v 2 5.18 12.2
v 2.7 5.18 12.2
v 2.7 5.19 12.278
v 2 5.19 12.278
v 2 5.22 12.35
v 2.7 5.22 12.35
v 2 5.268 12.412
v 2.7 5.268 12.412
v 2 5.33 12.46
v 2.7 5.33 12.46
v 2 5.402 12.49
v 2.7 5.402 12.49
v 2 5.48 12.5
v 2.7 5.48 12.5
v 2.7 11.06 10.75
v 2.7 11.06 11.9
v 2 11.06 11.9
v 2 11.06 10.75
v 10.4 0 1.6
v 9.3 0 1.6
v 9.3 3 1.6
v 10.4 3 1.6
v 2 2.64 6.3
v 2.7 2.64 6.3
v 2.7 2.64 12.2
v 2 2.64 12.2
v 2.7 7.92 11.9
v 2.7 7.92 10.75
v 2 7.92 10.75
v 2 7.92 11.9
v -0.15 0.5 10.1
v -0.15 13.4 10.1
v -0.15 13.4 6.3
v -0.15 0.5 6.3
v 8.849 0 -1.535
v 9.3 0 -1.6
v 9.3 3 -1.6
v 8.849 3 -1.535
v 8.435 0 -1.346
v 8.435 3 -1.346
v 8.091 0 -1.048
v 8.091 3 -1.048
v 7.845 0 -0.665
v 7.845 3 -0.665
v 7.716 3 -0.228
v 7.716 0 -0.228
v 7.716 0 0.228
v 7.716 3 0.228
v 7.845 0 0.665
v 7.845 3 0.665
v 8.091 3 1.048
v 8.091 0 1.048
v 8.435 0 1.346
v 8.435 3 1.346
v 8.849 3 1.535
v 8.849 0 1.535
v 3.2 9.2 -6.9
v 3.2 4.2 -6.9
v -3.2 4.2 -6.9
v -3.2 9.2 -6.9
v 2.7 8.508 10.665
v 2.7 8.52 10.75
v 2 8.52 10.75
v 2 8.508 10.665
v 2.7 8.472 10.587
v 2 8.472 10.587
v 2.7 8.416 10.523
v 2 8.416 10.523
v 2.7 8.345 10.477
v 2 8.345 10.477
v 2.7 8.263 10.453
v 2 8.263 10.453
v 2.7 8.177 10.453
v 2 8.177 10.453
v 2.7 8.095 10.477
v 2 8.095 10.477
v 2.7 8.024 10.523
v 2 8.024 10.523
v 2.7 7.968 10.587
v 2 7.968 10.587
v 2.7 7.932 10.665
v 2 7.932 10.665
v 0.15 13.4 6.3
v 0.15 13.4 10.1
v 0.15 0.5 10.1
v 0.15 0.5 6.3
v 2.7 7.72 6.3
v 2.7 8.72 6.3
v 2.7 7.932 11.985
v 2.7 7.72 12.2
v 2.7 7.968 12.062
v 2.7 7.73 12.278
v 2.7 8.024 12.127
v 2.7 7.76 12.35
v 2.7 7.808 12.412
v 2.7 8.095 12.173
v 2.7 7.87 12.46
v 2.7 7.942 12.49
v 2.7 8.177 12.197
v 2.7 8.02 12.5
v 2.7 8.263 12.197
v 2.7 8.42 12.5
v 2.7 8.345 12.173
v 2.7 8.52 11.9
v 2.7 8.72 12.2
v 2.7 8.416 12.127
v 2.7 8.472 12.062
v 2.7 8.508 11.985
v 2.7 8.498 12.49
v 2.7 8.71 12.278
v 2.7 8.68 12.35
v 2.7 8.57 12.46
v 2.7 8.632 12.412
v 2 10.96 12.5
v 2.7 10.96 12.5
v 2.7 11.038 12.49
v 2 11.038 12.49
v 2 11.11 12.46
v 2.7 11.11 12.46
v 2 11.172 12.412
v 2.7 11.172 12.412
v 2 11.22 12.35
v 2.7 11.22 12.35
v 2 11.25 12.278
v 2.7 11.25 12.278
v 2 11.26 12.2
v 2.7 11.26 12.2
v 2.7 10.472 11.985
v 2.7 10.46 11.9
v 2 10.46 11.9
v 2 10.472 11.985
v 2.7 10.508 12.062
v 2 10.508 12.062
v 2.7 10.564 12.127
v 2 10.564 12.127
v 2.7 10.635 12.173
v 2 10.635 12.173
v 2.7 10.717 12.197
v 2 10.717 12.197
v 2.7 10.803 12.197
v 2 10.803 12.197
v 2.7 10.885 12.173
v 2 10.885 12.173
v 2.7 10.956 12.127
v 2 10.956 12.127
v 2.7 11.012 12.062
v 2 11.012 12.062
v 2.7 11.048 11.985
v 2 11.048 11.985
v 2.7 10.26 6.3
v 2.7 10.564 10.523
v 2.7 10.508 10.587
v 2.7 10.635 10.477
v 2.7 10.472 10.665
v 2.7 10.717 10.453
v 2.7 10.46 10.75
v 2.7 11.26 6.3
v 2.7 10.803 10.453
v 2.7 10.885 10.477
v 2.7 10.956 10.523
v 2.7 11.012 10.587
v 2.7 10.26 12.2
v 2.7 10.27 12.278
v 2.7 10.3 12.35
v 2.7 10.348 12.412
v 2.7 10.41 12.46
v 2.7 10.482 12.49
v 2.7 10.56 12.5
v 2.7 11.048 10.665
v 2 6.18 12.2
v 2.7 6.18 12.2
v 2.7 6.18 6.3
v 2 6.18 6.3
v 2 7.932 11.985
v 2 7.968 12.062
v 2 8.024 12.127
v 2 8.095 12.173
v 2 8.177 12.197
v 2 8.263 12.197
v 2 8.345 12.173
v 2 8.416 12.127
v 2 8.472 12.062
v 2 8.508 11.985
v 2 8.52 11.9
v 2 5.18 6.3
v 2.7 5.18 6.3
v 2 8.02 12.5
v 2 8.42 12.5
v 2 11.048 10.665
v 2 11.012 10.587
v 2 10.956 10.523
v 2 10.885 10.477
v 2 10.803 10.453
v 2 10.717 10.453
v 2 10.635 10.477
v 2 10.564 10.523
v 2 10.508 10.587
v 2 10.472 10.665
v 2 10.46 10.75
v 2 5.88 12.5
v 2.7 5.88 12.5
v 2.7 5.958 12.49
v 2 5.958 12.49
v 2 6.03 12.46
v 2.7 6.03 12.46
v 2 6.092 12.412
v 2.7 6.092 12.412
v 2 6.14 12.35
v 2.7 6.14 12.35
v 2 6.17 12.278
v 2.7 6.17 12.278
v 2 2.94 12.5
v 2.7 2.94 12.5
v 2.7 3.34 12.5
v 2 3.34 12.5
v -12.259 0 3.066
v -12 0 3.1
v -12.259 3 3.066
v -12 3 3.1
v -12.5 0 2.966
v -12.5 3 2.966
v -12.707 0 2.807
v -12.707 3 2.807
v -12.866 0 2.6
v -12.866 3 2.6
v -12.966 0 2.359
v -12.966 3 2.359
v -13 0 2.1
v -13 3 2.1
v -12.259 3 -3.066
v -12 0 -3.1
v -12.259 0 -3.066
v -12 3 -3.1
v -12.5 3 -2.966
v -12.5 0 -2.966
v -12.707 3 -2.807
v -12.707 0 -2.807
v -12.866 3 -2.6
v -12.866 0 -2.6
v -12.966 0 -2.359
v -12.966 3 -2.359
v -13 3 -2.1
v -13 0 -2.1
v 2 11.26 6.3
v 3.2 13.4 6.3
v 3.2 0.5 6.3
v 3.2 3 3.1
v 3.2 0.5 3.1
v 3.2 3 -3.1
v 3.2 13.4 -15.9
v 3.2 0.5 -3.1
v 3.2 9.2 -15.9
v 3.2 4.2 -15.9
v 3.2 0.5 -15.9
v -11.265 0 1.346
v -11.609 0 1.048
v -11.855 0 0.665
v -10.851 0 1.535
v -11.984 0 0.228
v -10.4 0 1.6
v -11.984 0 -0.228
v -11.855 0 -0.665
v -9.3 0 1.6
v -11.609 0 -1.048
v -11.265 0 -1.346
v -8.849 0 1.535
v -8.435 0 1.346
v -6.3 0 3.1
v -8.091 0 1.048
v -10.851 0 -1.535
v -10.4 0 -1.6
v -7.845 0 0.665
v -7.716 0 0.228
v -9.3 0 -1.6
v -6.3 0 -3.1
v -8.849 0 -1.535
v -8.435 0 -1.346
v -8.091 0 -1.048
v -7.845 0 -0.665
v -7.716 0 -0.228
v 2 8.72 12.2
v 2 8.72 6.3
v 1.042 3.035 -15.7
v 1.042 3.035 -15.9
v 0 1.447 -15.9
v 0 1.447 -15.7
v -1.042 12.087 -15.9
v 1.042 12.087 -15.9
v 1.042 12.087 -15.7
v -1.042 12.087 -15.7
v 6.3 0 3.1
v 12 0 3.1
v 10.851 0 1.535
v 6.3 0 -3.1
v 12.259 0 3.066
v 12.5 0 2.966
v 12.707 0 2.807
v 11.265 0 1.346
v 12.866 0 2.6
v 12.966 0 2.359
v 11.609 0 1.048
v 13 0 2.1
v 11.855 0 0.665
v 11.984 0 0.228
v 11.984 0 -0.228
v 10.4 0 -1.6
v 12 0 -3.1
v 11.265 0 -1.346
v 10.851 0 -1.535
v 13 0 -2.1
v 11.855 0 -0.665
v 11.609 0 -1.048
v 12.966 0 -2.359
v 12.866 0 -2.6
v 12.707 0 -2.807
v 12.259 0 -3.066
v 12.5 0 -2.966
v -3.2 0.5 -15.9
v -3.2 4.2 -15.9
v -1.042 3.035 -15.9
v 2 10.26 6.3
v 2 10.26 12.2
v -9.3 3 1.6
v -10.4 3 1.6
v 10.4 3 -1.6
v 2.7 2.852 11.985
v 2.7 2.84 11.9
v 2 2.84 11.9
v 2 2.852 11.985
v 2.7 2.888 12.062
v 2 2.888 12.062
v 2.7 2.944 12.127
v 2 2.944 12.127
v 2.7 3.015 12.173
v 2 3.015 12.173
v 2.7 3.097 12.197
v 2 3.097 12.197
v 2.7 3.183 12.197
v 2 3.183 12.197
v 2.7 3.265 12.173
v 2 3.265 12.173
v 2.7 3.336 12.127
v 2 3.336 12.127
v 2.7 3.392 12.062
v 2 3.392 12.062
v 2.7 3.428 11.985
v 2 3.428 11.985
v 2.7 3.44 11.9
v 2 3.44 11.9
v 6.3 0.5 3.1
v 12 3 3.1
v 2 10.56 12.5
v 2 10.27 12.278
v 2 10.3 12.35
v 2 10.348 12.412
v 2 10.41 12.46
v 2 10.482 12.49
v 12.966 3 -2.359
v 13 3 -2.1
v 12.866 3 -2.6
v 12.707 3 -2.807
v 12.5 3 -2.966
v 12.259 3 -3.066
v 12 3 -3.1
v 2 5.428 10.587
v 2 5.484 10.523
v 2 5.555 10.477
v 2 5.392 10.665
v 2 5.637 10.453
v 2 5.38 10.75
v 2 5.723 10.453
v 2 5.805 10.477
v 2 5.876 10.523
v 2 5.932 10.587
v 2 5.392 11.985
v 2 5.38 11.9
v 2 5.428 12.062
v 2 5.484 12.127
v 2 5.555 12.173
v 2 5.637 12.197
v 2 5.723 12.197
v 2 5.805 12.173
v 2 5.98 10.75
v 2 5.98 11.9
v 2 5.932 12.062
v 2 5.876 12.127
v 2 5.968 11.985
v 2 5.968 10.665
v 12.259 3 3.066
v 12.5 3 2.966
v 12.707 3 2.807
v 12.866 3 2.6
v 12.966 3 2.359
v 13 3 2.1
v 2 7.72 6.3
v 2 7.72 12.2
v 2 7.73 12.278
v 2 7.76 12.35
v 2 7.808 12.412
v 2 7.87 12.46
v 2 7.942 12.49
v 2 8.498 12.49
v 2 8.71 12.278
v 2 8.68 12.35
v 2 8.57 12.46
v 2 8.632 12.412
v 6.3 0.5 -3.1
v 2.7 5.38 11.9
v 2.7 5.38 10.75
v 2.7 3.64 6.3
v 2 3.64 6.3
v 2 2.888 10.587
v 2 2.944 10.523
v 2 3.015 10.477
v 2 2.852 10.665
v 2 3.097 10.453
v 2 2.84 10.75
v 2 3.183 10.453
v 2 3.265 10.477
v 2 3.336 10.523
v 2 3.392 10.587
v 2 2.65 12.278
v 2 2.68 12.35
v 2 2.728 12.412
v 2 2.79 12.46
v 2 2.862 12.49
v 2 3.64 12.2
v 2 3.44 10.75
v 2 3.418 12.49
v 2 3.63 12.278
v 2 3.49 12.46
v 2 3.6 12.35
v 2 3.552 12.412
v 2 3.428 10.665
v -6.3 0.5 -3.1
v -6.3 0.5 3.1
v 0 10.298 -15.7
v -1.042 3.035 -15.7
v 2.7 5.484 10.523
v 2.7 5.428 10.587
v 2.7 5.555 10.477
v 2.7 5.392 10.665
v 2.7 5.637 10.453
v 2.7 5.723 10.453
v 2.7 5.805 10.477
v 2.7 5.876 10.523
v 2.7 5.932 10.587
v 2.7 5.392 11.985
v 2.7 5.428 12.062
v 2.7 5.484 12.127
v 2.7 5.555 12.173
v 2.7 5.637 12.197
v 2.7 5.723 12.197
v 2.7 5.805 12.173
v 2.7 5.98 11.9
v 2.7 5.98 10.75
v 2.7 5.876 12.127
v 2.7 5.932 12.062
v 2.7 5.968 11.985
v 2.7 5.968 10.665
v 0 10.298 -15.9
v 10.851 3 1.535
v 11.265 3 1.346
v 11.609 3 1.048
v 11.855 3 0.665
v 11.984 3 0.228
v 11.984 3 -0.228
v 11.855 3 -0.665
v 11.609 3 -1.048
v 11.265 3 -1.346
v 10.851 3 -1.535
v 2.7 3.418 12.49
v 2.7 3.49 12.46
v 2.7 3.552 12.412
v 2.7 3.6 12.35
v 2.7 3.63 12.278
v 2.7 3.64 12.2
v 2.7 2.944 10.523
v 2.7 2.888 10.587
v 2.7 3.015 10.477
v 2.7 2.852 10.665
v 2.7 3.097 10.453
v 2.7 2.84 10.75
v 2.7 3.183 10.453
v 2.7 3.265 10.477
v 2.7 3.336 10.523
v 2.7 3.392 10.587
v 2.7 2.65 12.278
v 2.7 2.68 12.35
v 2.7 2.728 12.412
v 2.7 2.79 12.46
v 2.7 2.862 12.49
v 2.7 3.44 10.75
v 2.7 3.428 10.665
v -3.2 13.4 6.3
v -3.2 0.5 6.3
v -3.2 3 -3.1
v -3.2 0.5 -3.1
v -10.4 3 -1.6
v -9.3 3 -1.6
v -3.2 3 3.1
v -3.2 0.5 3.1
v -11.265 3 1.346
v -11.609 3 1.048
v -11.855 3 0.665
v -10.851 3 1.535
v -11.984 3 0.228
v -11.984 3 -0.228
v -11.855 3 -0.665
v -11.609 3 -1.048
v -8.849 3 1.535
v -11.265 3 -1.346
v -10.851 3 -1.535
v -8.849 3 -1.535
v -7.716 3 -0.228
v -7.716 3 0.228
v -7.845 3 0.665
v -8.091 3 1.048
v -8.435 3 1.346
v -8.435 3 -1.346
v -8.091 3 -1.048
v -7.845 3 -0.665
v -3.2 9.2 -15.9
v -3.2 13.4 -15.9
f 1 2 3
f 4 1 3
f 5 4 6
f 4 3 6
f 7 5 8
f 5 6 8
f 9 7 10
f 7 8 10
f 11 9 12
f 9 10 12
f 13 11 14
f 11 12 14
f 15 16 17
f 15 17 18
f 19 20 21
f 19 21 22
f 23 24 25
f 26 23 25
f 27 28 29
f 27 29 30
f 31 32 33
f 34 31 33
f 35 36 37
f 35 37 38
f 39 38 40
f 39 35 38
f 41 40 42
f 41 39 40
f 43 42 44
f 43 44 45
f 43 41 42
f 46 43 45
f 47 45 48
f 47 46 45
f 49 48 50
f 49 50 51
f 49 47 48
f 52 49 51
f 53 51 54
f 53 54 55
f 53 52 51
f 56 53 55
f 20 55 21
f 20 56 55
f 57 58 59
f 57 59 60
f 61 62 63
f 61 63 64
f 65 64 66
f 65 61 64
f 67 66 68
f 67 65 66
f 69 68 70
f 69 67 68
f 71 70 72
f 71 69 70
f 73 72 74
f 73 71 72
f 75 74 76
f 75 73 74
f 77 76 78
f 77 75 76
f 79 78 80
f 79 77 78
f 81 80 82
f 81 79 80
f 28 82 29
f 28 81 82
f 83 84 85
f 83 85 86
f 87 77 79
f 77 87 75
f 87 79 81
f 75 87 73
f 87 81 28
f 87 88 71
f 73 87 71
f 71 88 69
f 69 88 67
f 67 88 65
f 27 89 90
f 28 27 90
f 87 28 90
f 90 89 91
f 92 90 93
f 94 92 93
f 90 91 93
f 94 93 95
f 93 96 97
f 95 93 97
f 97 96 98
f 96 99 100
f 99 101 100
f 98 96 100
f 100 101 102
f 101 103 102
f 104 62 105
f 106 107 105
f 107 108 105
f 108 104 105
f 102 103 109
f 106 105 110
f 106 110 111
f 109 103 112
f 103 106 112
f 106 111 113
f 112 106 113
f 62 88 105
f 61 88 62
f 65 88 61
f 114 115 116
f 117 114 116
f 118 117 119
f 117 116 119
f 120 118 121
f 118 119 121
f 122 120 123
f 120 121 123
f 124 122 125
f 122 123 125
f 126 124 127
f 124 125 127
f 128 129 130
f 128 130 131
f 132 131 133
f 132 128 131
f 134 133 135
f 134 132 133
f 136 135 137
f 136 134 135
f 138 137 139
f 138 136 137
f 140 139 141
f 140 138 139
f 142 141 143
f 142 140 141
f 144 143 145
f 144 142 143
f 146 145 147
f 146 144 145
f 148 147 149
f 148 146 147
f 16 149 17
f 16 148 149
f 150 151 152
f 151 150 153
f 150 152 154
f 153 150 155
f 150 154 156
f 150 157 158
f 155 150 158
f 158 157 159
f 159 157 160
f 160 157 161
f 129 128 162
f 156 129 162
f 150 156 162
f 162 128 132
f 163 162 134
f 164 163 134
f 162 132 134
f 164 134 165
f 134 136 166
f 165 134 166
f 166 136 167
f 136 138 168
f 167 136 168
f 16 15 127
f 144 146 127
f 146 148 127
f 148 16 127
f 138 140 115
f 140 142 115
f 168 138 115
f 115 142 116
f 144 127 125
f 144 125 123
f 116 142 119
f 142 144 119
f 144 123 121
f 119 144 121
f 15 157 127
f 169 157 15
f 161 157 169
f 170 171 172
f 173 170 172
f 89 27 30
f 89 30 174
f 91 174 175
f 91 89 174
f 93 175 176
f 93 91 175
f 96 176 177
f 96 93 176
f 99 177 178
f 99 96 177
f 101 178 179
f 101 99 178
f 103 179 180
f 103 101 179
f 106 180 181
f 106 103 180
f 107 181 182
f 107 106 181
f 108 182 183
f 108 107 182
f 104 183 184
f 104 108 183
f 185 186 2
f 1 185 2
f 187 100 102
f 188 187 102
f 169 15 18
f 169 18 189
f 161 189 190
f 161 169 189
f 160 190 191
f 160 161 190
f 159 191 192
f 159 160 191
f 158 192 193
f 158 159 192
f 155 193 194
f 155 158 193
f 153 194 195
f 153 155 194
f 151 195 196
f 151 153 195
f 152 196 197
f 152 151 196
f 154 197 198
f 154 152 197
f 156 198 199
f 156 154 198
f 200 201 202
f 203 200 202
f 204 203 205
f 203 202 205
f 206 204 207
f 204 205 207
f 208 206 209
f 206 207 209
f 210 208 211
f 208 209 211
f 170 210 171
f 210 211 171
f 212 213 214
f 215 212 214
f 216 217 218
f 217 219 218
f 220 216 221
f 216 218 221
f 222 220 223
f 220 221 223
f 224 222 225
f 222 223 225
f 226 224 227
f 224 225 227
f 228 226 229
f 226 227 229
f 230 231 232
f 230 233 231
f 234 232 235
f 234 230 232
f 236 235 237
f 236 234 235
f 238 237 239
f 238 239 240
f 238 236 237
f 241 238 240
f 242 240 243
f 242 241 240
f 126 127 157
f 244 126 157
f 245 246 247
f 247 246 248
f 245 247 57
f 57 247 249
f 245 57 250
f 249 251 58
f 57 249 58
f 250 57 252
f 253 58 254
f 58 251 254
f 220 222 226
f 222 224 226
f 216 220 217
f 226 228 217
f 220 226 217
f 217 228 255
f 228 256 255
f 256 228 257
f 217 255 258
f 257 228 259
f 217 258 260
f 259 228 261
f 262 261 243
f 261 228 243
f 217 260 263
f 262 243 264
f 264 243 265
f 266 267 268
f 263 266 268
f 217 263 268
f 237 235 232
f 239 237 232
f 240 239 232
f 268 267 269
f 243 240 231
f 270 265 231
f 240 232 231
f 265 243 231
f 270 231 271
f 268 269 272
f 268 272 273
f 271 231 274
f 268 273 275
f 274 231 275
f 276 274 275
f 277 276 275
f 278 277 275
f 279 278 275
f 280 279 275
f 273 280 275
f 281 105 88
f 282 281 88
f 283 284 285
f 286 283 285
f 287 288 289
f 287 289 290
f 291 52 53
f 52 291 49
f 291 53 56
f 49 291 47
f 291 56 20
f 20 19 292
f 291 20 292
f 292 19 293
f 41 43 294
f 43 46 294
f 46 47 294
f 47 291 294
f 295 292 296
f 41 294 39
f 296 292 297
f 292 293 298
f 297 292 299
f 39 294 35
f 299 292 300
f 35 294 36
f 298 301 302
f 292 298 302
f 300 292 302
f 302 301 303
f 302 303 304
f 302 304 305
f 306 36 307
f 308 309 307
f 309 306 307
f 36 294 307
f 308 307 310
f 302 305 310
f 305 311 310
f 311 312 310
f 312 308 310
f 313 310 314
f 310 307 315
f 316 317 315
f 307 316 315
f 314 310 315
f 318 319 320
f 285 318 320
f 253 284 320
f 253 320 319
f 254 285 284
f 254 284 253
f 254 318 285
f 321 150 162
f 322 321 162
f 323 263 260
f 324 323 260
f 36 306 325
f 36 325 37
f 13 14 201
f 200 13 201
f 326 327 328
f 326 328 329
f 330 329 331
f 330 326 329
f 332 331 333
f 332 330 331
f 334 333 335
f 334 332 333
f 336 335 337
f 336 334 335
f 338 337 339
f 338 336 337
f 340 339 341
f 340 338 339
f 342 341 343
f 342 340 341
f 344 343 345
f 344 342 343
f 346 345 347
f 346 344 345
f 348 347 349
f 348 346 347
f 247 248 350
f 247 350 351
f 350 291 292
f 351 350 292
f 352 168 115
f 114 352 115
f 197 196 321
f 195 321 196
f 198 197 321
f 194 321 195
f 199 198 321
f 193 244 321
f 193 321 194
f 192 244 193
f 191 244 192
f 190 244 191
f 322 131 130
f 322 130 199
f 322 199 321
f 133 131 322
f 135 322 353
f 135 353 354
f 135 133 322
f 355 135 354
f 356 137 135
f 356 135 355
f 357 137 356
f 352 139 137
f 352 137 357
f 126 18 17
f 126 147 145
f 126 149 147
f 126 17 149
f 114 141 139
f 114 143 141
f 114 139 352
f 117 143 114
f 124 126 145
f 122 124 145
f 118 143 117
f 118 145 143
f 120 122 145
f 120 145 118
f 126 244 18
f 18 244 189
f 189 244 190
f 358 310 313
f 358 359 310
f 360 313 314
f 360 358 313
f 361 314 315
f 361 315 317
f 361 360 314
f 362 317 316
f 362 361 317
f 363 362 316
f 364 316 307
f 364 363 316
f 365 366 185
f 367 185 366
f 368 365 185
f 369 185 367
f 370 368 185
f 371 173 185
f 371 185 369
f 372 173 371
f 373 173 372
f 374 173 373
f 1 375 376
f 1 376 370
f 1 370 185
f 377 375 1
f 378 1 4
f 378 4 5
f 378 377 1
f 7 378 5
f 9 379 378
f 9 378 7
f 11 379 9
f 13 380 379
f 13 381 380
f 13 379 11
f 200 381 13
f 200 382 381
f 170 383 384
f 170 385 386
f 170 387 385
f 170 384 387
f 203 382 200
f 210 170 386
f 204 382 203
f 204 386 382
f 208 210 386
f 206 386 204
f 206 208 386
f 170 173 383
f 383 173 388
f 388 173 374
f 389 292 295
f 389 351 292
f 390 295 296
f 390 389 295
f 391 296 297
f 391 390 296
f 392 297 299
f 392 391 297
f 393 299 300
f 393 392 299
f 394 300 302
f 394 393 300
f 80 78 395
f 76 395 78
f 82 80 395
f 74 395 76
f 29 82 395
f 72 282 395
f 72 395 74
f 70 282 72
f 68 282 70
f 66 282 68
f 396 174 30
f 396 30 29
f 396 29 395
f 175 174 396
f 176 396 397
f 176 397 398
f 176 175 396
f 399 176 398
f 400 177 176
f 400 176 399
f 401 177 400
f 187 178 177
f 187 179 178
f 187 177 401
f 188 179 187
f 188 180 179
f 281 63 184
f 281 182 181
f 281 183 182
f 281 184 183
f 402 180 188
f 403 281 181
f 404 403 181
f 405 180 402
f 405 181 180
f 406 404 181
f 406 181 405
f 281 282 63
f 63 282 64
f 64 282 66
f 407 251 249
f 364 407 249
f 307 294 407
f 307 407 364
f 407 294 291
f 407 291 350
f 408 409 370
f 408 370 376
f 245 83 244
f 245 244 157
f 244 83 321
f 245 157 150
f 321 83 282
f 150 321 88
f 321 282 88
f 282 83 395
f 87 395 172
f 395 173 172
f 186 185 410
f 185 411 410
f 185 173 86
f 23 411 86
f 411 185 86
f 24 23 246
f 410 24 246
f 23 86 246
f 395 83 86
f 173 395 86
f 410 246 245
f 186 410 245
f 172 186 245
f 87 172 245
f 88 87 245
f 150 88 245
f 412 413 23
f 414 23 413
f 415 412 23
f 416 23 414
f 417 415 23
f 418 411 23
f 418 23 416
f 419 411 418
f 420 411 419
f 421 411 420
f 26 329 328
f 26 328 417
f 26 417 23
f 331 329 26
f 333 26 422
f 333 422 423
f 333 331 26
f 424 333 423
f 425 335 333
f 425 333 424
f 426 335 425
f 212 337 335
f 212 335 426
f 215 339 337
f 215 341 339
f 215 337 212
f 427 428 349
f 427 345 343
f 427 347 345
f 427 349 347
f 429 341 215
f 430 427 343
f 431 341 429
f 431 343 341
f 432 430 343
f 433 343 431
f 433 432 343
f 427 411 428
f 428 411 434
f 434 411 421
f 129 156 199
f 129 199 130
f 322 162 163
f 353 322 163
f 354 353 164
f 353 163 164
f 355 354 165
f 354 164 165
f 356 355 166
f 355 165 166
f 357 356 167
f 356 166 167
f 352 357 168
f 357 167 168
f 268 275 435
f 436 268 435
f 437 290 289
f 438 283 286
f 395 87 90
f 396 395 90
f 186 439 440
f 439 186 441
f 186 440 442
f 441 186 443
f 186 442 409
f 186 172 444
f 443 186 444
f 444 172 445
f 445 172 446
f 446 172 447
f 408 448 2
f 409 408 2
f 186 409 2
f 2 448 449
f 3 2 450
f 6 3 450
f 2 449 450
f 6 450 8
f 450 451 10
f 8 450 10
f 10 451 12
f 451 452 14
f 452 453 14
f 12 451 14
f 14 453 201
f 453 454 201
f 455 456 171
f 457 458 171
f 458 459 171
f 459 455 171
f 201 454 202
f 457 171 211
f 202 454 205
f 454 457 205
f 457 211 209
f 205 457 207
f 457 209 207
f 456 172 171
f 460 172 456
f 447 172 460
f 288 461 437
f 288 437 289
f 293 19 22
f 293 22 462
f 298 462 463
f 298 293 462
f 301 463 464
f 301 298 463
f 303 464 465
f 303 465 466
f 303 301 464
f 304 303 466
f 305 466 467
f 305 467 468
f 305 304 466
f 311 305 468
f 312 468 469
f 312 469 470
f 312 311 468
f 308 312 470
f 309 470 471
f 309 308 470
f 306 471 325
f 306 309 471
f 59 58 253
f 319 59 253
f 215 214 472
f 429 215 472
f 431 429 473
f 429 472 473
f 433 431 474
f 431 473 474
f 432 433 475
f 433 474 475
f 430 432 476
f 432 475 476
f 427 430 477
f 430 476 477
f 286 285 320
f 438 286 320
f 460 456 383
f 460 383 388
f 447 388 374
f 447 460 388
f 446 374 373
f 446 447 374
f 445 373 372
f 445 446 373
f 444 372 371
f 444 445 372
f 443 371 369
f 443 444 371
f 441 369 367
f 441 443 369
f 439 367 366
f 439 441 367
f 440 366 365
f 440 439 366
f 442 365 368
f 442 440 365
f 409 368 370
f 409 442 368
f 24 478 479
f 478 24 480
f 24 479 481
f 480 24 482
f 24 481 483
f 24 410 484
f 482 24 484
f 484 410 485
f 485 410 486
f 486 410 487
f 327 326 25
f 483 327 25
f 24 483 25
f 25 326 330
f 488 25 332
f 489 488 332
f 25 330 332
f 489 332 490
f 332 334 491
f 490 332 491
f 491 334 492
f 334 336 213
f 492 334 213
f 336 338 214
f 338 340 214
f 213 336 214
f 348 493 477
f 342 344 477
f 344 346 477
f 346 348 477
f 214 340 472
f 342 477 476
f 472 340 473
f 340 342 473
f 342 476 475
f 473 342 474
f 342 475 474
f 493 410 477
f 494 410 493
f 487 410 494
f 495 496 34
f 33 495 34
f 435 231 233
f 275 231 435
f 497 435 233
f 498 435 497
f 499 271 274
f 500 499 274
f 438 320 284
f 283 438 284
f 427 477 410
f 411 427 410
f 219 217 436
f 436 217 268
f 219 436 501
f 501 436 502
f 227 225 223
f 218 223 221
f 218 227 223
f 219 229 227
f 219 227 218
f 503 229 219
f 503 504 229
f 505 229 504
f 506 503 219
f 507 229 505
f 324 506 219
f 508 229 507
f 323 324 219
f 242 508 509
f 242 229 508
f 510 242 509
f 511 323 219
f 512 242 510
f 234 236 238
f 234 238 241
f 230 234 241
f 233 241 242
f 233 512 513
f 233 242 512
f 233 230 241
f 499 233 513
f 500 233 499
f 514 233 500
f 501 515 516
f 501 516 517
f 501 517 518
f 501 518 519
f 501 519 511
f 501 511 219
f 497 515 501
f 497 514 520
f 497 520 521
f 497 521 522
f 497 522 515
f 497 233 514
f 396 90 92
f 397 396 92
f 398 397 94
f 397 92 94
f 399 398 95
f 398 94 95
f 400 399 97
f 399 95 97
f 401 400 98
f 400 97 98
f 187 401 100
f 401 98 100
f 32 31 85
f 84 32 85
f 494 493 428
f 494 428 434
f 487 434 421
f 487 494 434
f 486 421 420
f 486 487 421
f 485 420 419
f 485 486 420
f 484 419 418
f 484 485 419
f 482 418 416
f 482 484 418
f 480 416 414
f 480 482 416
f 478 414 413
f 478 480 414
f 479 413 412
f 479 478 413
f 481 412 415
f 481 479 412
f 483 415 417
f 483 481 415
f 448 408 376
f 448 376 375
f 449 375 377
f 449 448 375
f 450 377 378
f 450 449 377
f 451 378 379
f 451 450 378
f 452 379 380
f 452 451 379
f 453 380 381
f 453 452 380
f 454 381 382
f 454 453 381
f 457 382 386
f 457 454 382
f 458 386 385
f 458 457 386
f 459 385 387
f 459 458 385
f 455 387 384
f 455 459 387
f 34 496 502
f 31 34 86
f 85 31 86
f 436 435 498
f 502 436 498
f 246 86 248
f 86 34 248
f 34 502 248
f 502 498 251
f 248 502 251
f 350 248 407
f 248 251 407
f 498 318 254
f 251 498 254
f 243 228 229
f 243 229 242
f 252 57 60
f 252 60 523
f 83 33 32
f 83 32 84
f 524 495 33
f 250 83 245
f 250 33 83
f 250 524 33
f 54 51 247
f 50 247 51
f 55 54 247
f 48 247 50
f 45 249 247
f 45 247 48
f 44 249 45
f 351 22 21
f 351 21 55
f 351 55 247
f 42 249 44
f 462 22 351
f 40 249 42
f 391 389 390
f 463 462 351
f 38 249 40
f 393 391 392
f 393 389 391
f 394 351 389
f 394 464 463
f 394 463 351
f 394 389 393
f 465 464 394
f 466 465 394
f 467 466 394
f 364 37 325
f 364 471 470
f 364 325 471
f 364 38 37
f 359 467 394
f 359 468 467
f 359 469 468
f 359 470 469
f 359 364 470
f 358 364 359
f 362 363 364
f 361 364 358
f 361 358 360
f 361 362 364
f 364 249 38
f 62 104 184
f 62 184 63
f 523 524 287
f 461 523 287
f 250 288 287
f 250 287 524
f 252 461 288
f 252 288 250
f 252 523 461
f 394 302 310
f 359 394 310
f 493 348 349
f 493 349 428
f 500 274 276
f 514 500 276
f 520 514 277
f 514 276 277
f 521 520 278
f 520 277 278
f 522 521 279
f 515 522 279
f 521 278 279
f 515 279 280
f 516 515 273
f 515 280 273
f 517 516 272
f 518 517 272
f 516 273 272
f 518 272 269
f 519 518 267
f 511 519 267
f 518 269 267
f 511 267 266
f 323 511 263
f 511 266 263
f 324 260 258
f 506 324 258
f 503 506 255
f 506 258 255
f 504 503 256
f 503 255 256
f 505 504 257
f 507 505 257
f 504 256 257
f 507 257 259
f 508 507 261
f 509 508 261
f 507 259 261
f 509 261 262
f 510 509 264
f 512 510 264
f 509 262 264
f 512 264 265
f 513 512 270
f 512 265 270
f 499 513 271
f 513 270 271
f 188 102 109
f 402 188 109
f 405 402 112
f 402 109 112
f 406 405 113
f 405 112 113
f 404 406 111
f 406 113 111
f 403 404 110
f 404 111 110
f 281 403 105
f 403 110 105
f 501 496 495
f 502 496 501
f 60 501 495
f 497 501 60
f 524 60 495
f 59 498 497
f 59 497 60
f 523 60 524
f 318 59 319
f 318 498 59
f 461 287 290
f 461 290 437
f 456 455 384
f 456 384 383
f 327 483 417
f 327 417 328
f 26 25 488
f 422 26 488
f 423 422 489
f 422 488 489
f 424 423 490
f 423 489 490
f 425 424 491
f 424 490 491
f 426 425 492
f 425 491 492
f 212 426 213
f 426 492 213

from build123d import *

# Parameters (mm, degrees)
SKETCH2_W               = 26
SKETCH2_H               = 6.2
BOSS_EXTRUDE1_DEPTH     = 3
SKETCH3_W               = 6.4
SKETCH3_H               = 22.2
BOSS_EXTRUDE2_DEPTH     = 13.4
SKETCH4_W               = 9
SKETCH4_H               = 5
CUT_EXTRUDE1_DEPTH      = 27.359248851
FILLET1_R               = 1
CUT_EXTRUDE2_DEPTH      = 25.522846491
CUT_EXTRUDE2_DEPTH_BACK = 25.522846491
SKETCH6_W               = 12.6
SKETCH6_H               = 0.5
SKETCH8_W               = 0.3
SKETCH8_H               = 3.8
BOSS_EXTRUDE4_DEPTH     = 12.9
BOSS_EXTRUDE5_START     = -0.5
BOSS_EXTRUDE5_DEPTH     = 0.7
CUT_EXTRUDE3_DEPTH      = 0.2


with BuildPart() as part:
    # Sketch2 → Boss-Extrude1 (new body)
    with BuildSketch(Plane(origin=(0, 0, 0), x_dir=(1, 0, 0), z_dir=(0, 1, 0))):
        Rectangle(SKETCH2_W, SKETCH2_H)
        with BuildLine():
            Line((-10.4, 1.6), (-9.3, 1.6))
            ThreePointArc((-9.3, 1.6), (-7.7, 0), (-9.3, -1.6))
            Line((-9.3, -1.6), (-10.4, -1.6))
            ThreePointArc((-10.4, -1.6), (-12, 0), (-10.4, 1.6))
        make_face(mode=Mode.SUBTRACT)
        with BuildLine():
            Line((10.4, 1.6), (9.3, 1.6))
            ThreePointArc((9.3, 1.6), (7.7, 0), (9.3, -1.6))
            Line((9.3, -1.6), (10.4, -1.6))
            ThreePointArc((10.4, -1.6), (12, 0), (10.4, 1.6))
        make_face(mode=Mode.SUBTRACT)
    extrude(amount=BOSS_EXTRUDE1_DEPTH)

    # Sketch3 → Boss-Extrude2 (add)
    with BuildSketch(Plane(origin=(0, 0, 0), x_dir=(1, 0, 0), z_dir=(0, 1, 0))):
        with Locations((0, 4.8)):
            Rectangle(SKETCH3_W, SKETCH3_H)
    extrude(amount=BOSS_EXTRUDE2_DEPTH)

    # Sketch4 → Cut-Extrude1 (cut, through all)
    with BuildSketch(Plane(origin=(3.2, 0, 0), x_dir=(0, 0, -1), z_dir=(1, 0, 0))):
        with Locations((11.4, 6.7)):
            Rectangle(SKETCH4_W, SKETCH4_H)
    extrude(amount=-CUT_EXTRUDE1_DEPTH, mode=Mode.SUBTRACT)

    # Fillet1
    fillet1_edges = [part.edges().sort_by_distance(p)[0] for p in [
        (-13, 1.5, -3.1),
        (13, 1.5, -3.1),
        (13, 1.5, 3.1),
        (-13, 1.5, 3.1),
    ]]
    fillet(fillet1_edges, radius=FILLET1_R)

    # Sketch6 → Cut-Extrude2 (cut, two sides: drawn at the far end of the back side and taken through both)
    with BuildSketch(Plane.XY.offset(-CUT_EXTRUDE2_DEPTH_BACK)):
        with Locations((0, 0.25)):
            Rectangle(SKETCH6_W, SKETCH6_H)
    extrude(amount=CUT_EXTRUDE2_DEPTH + CUT_EXTRUDE2_DEPTH_BACK, mode=Mode.SUBTRACT)

    # Sketch8 → Boss-Extrude4 (add)
    with BuildSketch(Plane(origin=(0, 13.4, 0), x_dir=(1, 0, 0), z_dir=(0, 1, 0))):
        with Locations((0, -8.2)):
            Rectangle(SKETCH8_W, SKETCH8_H)
    extrude(amount=-BOSS_EXTRUDE4_DEPTH)

    # Sketch9 → Boss-Extrude5 (add)
    # profile 1 of 4: a face of its own
    with BuildSketch(Plane(origin=(3.2, 0, 0), x_dir=(0, 0, -1), z_dir=(1, 0, 0)).offset(BOSS_EXTRUDE5_START)):
        with BuildLine():
            Line((-6.3, 7.72), (-12.2, 7.72))
            ThreePointArc((-12.2, 7.72), (-12.412132034, 7.807867966), (-12.5, 8.02))
            Line((-12.5, 8.02), (-12.5, 8.42))
            ThreePointArc((-12.5, 8.42), (-12.412132034, 8.632132034), (-12.2, 8.72))
            Line((-12.2, 8.72), (-6.3, 8.72))
            Line((-6.3, 8.72), (-6.3, 7.72))
        make_face()
        with BuildLine():
            Line((-11.9, 8.52), (-10.749572658, 8.52))
            ThreePointArc((-10.749572658, 8.52), (-10.449572658, 8.22), (-10.749572658, 7.92))
            Line((-10.749572658, 7.92), (-11.9, 7.92))
            ThreePointArc((-11.9, 7.92), (-12.2, 8.22), (-11.9, 8.52))
        make_face(mode=Mode.SUBTRACT)
    # profile 2 of 4: a face of its own
    with BuildSketch(Plane(origin=(3.2, 0, 0), x_dir=(0, 0, -1), z_dir=(1, 0, 0)).offset(BOSS_EXTRUDE5_START)):
        with BuildLine():
            Line((-6.3, 10.26), (-12.2, 10.26))
            ThreePointArc((-12.2, 10.26), (-12.412132034, 10.347867966), (-12.5, 10.56))
            Line((-12.5, 10.56), (-12.5, 10.96))
            ThreePointArc((-12.5, 10.96), (-12.412132034, 11.172132034), (-12.2, 11.26))
            Line((-12.2, 11.26), (-6.3, 11.26))
            Line((-6.3, 11.26), (-6.3, 10.26))
        make_face()
        with BuildLine():
            Line((-11.9, 11.06), (-10.749572658, 11.06))
            ThreePointArc((-10.749572658, 11.06), (-10.449572658, 10.76), (-10.749572658, 10.46))
            Line((-10.749572658, 10.46), (-11.9, 10.46))
            ThreePointArc((-11.9, 10.46), (-12.2, 10.76), (-11.9, 11.06))
        make_face(mode=Mode.SUBTRACT)
    # profile 3 of 4: a face of its own
    with BuildSketch(Plane(origin=(3.2, 0, 0), x_dir=(0, 0, -1), z_dir=(1, 0, 0)).offset(BOSS_EXTRUDE5_START)):
        with BuildLine():
            Line((-6.3, 5.18), (-12.2, 5.18))
            ThreePointArc((-12.2, 5.18), (-12.412132034, 5.267867966), (-12.5, 5.48))
            Line((-12.5, 5.48), (-12.5, 5.88))
            ThreePointArc((-12.5, 5.88), (-12.412132034, 6.092132034), (-12.2, 6.18))
            Line((-12.2, 6.18), (-6.3, 6.18))
            Line((-6.3, 6.18), (-6.3, 5.18))
        make_face()
        with BuildLine():
            Line((-11.9, 5.98), (-10.749572658, 5.98))
            ThreePointArc((-10.749572658, 5.98), (-10.449572658, 5.68), (-10.749572658, 5.38))
            Line((-10.749572658, 5.38), (-11.9, 5.38))
            ThreePointArc((-11.9, 5.38), (-12.2, 5.68), (-11.9, 5.98))
        make_face(mode=Mode.SUBTRACT)
    # profile 4 of 4: a face of its own
    with BuildSketch(Plane(origin=(3.2, 0, 0), x_dir=(0, 0, -1), z_dir=(1, 0, 0)).offset(BOSS_EXTRUDE5_START)):
        with BuildLine():
            Line((-6.3, 2.64), (-12.2, 2.64))
            ThreePointArc((-12.2, 2.64), (-12.412132034, 2.727867966), (-12.5, 2.94))
            Line((-12.5, 2.94), (-12.5, 3.34))
            ThreePointArc((-12.5, 3.34), (-12.412132034, 3.552132034), (-12.2, 3.64))
            Line((-12.2, 3.64), (-6.3, 3.64))
            Line((-6.3, 3.64), (-6.3, 2.64))
        make_face()
        with BuildLine():
            Line((-11.9, 3.44), (-10.749572658, 3.44))
            ThreePointArc((-10.749572658, 3.44), (-10.449572658, 3.14), (-10.749572658, 2.84))
            Line((-10.749572658, 2.84), (-11.9, 2.84))
            ThreePointArc((-11.9, 2.84), (-12.2, 3.14), (-11.9, 3.44))
        make_face(mode=Mode.SUBTRACT)
    extrude(amount=-BOSS_EXTRUDE5_DEPTH)

    # Sketch10 → Cut-Extrude3 (cut)
    with BuildSketch(Plane(origin=(0, 0, -15.9), x_dir=(-1, 0, 0), z_dir=(0, 0, -1))):
        Polygon((0, 10.297511632), (-1.041523937, 12.086883848), (1.041523937, 12.086883848), align=None)
        Polygon((1.041523937, 3.034586906), (-1.041523937, 3.034586906), (0, 1.447107426), align=None)
    extrude(amount=-CUT_EXTRUDE3_DEPTH, mode=Mode.SUBTRACT)


solid = part.part
